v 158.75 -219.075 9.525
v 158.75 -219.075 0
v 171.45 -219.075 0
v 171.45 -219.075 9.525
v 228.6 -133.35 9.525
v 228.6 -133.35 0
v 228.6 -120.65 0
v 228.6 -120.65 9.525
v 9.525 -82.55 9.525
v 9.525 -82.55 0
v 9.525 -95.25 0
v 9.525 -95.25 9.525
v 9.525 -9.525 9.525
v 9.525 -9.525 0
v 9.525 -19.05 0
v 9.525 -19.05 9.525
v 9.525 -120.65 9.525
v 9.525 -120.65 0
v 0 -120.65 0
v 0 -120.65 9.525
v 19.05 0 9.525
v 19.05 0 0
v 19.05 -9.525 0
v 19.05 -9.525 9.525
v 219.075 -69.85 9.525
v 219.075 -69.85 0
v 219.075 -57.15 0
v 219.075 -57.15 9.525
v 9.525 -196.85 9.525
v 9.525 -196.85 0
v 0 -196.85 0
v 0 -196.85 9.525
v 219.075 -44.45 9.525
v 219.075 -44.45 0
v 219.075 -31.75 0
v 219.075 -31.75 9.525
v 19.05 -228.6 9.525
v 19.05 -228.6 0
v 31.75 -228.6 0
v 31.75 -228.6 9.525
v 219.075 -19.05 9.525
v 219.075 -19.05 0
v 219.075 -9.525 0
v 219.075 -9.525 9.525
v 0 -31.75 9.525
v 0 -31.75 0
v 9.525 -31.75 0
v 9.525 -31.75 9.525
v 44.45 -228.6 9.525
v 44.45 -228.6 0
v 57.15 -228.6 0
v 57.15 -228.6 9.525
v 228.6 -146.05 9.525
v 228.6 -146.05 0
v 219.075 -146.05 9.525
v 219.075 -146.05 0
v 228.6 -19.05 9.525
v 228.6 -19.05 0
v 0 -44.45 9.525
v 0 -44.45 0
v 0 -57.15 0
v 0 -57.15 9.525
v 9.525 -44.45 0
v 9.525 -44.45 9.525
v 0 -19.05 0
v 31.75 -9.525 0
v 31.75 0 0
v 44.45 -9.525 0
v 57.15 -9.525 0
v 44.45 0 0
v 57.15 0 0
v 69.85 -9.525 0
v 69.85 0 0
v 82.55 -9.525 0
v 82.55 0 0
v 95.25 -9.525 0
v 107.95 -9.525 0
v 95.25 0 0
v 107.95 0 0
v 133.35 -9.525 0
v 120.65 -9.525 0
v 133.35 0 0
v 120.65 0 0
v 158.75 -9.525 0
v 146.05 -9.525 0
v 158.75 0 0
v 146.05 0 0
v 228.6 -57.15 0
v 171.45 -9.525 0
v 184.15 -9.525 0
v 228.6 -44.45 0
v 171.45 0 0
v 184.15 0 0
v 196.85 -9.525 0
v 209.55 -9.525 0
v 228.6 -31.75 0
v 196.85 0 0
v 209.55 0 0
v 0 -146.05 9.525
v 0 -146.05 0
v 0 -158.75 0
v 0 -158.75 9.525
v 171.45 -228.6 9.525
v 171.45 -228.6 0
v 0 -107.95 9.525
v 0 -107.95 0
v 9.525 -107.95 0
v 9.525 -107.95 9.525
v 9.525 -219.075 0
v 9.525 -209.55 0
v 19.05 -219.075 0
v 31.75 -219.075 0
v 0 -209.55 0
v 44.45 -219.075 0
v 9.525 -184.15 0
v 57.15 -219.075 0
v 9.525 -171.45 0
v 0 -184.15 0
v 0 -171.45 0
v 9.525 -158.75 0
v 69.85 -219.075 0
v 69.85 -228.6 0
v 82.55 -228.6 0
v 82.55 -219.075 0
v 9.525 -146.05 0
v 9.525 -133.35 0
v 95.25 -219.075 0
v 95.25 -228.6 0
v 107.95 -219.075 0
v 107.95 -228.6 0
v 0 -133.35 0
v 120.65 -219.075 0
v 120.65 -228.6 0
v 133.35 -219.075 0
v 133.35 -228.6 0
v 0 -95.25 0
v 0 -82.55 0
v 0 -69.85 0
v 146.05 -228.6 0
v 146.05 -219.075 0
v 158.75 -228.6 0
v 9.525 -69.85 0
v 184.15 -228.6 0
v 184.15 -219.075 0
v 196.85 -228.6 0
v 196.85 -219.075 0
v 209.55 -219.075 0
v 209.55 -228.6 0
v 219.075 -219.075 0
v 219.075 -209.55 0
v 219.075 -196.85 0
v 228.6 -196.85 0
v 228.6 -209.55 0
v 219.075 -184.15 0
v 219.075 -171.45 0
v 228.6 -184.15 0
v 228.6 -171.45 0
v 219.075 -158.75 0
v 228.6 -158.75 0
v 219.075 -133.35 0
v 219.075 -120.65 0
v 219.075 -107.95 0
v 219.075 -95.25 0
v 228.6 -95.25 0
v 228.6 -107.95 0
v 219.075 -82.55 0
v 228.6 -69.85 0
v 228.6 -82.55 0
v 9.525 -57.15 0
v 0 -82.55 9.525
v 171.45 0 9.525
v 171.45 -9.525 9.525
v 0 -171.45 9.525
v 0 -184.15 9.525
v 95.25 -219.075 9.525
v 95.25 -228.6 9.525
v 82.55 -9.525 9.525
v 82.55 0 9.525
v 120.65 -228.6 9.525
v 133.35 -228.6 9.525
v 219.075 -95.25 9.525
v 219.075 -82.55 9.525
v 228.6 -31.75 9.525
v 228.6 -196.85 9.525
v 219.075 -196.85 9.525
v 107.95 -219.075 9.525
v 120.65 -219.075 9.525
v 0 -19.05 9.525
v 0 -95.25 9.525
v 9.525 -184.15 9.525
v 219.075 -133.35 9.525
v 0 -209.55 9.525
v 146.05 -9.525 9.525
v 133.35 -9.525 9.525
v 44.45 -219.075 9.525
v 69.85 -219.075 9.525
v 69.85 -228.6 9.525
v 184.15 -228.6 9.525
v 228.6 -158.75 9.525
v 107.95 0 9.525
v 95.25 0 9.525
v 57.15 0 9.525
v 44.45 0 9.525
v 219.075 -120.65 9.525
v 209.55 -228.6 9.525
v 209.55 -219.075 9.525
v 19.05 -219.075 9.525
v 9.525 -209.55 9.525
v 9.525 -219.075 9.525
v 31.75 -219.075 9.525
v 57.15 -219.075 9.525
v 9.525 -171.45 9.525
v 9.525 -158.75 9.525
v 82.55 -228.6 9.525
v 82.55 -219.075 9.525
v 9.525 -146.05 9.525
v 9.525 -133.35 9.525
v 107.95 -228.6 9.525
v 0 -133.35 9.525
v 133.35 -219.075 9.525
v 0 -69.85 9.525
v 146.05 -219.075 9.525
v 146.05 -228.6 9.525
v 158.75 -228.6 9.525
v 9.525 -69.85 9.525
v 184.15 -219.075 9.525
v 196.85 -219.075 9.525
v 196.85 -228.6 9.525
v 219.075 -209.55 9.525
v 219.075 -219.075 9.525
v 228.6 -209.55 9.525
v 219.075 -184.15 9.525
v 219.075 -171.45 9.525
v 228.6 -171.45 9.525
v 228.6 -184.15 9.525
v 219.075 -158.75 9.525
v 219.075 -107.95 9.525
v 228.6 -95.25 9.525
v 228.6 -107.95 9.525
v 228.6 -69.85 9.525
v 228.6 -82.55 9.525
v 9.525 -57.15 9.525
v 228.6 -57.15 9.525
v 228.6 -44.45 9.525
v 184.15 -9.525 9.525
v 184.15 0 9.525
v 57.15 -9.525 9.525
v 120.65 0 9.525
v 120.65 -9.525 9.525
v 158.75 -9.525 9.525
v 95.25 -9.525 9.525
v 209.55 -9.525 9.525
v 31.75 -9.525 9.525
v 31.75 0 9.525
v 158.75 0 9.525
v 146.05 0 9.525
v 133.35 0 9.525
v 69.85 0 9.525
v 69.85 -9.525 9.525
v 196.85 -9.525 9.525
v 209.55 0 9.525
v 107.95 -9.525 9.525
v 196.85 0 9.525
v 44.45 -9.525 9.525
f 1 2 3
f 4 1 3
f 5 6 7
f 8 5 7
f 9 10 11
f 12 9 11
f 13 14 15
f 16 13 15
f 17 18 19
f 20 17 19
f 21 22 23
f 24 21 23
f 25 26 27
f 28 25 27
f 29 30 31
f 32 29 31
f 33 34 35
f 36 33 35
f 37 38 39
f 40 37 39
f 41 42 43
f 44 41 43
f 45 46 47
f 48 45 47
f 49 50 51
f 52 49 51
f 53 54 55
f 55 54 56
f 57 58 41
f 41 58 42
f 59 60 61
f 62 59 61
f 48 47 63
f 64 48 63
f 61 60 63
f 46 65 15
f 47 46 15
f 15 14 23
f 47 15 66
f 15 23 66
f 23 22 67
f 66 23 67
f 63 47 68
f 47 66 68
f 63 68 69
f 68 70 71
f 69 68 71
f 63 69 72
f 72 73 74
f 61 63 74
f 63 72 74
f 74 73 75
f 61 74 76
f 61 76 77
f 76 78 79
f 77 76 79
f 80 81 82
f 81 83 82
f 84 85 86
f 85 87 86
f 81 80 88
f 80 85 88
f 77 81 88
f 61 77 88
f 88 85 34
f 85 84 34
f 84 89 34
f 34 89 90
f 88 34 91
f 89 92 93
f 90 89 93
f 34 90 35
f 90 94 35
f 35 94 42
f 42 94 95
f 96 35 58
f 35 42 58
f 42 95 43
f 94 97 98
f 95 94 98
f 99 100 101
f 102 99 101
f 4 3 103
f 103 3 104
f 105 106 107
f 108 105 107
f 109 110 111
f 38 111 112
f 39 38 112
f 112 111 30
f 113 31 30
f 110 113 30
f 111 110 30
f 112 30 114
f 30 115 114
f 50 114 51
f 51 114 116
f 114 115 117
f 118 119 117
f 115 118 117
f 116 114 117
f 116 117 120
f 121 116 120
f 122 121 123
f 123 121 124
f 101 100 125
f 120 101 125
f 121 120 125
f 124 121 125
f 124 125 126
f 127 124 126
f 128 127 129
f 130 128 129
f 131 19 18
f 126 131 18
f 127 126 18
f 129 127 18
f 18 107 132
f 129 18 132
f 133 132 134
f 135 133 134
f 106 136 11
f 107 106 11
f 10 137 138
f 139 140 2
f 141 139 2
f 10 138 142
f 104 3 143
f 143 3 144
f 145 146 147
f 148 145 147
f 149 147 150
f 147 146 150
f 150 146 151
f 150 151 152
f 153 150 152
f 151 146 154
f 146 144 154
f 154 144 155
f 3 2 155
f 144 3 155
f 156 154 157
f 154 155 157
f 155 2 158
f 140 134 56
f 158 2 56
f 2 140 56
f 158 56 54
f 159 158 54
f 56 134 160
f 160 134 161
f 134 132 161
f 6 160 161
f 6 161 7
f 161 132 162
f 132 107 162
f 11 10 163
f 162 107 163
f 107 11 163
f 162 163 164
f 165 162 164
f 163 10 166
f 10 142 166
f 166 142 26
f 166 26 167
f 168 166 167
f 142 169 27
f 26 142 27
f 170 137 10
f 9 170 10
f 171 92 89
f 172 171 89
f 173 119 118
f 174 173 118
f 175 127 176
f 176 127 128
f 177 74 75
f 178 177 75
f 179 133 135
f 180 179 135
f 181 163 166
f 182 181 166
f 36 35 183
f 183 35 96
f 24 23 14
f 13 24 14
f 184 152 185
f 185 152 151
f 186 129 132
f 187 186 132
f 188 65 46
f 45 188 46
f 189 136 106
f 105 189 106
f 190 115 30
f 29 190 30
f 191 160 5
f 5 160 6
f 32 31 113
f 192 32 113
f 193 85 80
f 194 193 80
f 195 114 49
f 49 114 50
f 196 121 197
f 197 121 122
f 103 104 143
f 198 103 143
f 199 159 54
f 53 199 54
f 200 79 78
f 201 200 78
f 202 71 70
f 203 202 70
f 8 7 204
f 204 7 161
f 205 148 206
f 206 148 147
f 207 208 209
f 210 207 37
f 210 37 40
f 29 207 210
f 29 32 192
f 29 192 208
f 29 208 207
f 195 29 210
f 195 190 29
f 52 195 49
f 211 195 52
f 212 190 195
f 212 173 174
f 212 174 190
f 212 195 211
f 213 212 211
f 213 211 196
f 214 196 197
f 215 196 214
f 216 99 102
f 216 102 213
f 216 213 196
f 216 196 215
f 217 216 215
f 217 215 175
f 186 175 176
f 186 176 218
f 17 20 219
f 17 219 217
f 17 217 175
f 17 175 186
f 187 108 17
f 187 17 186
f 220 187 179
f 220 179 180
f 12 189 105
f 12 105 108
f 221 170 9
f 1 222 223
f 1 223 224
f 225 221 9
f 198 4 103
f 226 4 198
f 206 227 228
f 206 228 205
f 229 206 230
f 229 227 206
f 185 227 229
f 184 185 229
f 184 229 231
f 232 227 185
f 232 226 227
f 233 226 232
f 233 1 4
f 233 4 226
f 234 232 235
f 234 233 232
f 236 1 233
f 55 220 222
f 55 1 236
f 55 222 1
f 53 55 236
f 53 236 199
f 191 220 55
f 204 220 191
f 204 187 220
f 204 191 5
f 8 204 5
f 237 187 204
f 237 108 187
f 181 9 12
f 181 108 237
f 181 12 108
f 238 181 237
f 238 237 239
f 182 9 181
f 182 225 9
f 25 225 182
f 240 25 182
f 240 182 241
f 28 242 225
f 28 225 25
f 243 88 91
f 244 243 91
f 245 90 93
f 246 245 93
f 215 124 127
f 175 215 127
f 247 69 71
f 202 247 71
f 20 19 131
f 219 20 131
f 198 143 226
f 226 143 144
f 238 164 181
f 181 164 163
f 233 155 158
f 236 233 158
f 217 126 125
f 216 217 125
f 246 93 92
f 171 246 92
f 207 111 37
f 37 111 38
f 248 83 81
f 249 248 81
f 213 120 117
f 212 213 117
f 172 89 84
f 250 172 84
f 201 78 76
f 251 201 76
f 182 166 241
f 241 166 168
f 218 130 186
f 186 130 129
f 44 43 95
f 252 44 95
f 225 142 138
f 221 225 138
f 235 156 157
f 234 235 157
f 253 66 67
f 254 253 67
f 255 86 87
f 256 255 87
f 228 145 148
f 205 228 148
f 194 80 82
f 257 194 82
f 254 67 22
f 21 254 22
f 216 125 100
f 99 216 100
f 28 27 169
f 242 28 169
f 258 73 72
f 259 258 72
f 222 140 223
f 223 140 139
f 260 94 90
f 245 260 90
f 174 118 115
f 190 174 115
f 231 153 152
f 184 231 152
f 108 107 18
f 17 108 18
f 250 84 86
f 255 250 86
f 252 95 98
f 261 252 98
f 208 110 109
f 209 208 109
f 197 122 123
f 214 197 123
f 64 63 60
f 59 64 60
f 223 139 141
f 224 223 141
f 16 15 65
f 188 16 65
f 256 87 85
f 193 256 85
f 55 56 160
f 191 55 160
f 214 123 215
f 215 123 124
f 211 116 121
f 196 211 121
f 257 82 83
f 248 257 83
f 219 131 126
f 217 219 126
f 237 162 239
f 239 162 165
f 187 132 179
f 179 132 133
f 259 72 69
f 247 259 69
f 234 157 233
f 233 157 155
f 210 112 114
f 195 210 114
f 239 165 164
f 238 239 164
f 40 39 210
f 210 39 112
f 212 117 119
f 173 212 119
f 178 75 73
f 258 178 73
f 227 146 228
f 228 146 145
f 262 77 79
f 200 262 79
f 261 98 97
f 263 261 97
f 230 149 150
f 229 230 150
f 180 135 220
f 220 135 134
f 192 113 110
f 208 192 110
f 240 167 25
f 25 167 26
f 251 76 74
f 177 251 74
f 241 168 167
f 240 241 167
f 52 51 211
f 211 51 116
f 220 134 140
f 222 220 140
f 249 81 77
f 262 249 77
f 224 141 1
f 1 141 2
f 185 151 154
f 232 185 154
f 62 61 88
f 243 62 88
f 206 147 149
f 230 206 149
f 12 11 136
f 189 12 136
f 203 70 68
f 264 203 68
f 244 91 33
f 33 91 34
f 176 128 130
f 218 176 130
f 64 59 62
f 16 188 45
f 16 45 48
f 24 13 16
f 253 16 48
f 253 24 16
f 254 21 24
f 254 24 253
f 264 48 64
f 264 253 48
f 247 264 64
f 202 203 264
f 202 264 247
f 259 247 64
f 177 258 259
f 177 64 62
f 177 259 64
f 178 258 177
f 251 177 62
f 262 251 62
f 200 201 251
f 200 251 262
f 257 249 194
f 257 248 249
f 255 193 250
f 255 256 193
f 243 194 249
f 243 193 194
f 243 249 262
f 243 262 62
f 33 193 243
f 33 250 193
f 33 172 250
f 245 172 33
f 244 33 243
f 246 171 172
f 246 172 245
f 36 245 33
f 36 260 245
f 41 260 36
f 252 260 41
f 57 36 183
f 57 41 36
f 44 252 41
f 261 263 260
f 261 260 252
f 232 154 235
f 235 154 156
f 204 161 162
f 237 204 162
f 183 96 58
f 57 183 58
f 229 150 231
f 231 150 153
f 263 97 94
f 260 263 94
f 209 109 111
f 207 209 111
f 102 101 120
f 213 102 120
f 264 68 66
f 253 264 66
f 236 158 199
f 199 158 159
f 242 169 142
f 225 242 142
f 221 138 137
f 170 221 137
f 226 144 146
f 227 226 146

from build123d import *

# Parameters (mm, degrees)
F1_DEPTH = 9.525
F2_DEPTH = 9.525


with BuildPart() as f1:
    # F0 (on Top) → F1 (new body)
    with BuildSketch(Plane.XY):
        Polygon((31.75, 0), (19.05, 0), (19.05, -9.525), (9.525, -9.525), (9.525, -19.05), (0, -19.05), (0, -31.75), (9.525, -31.75), (9.525, -44.45), (0, -44.45), (0, -57.15), (9.525, -57.15), (219.075, -57.15), (228.6, -57.15), (228.6, -44.45), (219.075, -44.45), (219.075, -31.75), (228.6, -31.75), (228.6, -19.05), (219.075, -19.05), (219.075, -9.525), (209.55, -9.525), (209.55, 0), (196.85, 0), (196.85, -9.525), (184.15, -9.525), (184.15, 0), (171.45, 0), (171.45, -9.525), (158.75, -9.525), (158.75, 0), (146.05, 0), (146.05, -9.525), (133.35, -9.525), (133.35, 0), (120.65, 0), (120.65, -9.525), (107.95, -9.525), (107.95, 0), (95.25, 0), (95.25, -9.525), (82.55, -9.525), (82.55, 0), (69.85, 0), (69.85, -9.525), (57.15, -9.525), (57.15, 0), (44.45, 0), (44.45, -9.525), (31.75, -9.525), align=None)
    extrude(amount=F1_DEPTH)


with BuildPart() as f2:
    # F0 (on Top) → F2 (new body)
    with BuildSketch(Plane.XY):
        Polygon((219.075, -57.15), (9.525, -57.15), (9.525, -69.85), (0, -69.85), (0, -82.55), (9.525, -82.55), (9.525, -95.25), (0, -95.25), (0, -107.95), (9.525, -107.95), (9.525, -120.65), (0, -120.65), (0, -133.35), (9.525, -133.35), (9.525, -146.05), (0, -146.05), (0, -158.75), (9.525, -158.75), (9.525, -171.45), (0, -171.45), (0, -184.15), (9.525, -184.15), (9.525, -196.85), (0, -196.85), (0, -209.55), (9.525, -209.55), (9.525, -219.075), (19.05, -219.075), (19.05, -228.6), (31.75, -228.6), (31.75, -219.075), (44.45, -219.075), (44.45, -228.6), (57.15, -228.6), (57.15, -219.075), (69.85, -219.075), (69.85, -228.6), (82.55, -228.6), (82.55, -219.075), (95.25, -219.075), (95.25, -228.6), (107.95, -228.6), (107.95, -219.075), (120.65, -219.075), (120.65, -228.6), (133.35, -228.6), (133.35, -219.075), (146.05, -219.075), (146.05, -228.6), (158.75, -228.6), (158.75, -219.075), (171.45, -219.075), (171.45, -228.6), (184.15, -228.6), (184.15, -219.075), (196.85, -219.075), (196.85, -228.6), (209.55, -228.6), (209.55, -219.075), (219.075, -219.075), (219.075, -209.55), (228.6, -209.55), (228.6, -196.85), (219.075, -196.85), (219.075, -184.15), (228.6, -184.15), (228.6, -171.45), (219.075, -171.45), (219.075, -158.75), (228.6, -158.75), (228.6, -146.05), (219.075, -146.05), (219.075, -133.35), (228.6, -133.35), (228.6, -120.65), (219.075, -120.65), (219.075, -107.95), (228.6, -107.95), (228.6, -95.25), (219.075, -95.25), (219.075, -82.55), (228.6, -82.55), (228.6, -69.85), (219.075, -69.85), align=None)
    extrude(amount=F2_DEPTH)


solid = Compound([f1.part, f2.part])
